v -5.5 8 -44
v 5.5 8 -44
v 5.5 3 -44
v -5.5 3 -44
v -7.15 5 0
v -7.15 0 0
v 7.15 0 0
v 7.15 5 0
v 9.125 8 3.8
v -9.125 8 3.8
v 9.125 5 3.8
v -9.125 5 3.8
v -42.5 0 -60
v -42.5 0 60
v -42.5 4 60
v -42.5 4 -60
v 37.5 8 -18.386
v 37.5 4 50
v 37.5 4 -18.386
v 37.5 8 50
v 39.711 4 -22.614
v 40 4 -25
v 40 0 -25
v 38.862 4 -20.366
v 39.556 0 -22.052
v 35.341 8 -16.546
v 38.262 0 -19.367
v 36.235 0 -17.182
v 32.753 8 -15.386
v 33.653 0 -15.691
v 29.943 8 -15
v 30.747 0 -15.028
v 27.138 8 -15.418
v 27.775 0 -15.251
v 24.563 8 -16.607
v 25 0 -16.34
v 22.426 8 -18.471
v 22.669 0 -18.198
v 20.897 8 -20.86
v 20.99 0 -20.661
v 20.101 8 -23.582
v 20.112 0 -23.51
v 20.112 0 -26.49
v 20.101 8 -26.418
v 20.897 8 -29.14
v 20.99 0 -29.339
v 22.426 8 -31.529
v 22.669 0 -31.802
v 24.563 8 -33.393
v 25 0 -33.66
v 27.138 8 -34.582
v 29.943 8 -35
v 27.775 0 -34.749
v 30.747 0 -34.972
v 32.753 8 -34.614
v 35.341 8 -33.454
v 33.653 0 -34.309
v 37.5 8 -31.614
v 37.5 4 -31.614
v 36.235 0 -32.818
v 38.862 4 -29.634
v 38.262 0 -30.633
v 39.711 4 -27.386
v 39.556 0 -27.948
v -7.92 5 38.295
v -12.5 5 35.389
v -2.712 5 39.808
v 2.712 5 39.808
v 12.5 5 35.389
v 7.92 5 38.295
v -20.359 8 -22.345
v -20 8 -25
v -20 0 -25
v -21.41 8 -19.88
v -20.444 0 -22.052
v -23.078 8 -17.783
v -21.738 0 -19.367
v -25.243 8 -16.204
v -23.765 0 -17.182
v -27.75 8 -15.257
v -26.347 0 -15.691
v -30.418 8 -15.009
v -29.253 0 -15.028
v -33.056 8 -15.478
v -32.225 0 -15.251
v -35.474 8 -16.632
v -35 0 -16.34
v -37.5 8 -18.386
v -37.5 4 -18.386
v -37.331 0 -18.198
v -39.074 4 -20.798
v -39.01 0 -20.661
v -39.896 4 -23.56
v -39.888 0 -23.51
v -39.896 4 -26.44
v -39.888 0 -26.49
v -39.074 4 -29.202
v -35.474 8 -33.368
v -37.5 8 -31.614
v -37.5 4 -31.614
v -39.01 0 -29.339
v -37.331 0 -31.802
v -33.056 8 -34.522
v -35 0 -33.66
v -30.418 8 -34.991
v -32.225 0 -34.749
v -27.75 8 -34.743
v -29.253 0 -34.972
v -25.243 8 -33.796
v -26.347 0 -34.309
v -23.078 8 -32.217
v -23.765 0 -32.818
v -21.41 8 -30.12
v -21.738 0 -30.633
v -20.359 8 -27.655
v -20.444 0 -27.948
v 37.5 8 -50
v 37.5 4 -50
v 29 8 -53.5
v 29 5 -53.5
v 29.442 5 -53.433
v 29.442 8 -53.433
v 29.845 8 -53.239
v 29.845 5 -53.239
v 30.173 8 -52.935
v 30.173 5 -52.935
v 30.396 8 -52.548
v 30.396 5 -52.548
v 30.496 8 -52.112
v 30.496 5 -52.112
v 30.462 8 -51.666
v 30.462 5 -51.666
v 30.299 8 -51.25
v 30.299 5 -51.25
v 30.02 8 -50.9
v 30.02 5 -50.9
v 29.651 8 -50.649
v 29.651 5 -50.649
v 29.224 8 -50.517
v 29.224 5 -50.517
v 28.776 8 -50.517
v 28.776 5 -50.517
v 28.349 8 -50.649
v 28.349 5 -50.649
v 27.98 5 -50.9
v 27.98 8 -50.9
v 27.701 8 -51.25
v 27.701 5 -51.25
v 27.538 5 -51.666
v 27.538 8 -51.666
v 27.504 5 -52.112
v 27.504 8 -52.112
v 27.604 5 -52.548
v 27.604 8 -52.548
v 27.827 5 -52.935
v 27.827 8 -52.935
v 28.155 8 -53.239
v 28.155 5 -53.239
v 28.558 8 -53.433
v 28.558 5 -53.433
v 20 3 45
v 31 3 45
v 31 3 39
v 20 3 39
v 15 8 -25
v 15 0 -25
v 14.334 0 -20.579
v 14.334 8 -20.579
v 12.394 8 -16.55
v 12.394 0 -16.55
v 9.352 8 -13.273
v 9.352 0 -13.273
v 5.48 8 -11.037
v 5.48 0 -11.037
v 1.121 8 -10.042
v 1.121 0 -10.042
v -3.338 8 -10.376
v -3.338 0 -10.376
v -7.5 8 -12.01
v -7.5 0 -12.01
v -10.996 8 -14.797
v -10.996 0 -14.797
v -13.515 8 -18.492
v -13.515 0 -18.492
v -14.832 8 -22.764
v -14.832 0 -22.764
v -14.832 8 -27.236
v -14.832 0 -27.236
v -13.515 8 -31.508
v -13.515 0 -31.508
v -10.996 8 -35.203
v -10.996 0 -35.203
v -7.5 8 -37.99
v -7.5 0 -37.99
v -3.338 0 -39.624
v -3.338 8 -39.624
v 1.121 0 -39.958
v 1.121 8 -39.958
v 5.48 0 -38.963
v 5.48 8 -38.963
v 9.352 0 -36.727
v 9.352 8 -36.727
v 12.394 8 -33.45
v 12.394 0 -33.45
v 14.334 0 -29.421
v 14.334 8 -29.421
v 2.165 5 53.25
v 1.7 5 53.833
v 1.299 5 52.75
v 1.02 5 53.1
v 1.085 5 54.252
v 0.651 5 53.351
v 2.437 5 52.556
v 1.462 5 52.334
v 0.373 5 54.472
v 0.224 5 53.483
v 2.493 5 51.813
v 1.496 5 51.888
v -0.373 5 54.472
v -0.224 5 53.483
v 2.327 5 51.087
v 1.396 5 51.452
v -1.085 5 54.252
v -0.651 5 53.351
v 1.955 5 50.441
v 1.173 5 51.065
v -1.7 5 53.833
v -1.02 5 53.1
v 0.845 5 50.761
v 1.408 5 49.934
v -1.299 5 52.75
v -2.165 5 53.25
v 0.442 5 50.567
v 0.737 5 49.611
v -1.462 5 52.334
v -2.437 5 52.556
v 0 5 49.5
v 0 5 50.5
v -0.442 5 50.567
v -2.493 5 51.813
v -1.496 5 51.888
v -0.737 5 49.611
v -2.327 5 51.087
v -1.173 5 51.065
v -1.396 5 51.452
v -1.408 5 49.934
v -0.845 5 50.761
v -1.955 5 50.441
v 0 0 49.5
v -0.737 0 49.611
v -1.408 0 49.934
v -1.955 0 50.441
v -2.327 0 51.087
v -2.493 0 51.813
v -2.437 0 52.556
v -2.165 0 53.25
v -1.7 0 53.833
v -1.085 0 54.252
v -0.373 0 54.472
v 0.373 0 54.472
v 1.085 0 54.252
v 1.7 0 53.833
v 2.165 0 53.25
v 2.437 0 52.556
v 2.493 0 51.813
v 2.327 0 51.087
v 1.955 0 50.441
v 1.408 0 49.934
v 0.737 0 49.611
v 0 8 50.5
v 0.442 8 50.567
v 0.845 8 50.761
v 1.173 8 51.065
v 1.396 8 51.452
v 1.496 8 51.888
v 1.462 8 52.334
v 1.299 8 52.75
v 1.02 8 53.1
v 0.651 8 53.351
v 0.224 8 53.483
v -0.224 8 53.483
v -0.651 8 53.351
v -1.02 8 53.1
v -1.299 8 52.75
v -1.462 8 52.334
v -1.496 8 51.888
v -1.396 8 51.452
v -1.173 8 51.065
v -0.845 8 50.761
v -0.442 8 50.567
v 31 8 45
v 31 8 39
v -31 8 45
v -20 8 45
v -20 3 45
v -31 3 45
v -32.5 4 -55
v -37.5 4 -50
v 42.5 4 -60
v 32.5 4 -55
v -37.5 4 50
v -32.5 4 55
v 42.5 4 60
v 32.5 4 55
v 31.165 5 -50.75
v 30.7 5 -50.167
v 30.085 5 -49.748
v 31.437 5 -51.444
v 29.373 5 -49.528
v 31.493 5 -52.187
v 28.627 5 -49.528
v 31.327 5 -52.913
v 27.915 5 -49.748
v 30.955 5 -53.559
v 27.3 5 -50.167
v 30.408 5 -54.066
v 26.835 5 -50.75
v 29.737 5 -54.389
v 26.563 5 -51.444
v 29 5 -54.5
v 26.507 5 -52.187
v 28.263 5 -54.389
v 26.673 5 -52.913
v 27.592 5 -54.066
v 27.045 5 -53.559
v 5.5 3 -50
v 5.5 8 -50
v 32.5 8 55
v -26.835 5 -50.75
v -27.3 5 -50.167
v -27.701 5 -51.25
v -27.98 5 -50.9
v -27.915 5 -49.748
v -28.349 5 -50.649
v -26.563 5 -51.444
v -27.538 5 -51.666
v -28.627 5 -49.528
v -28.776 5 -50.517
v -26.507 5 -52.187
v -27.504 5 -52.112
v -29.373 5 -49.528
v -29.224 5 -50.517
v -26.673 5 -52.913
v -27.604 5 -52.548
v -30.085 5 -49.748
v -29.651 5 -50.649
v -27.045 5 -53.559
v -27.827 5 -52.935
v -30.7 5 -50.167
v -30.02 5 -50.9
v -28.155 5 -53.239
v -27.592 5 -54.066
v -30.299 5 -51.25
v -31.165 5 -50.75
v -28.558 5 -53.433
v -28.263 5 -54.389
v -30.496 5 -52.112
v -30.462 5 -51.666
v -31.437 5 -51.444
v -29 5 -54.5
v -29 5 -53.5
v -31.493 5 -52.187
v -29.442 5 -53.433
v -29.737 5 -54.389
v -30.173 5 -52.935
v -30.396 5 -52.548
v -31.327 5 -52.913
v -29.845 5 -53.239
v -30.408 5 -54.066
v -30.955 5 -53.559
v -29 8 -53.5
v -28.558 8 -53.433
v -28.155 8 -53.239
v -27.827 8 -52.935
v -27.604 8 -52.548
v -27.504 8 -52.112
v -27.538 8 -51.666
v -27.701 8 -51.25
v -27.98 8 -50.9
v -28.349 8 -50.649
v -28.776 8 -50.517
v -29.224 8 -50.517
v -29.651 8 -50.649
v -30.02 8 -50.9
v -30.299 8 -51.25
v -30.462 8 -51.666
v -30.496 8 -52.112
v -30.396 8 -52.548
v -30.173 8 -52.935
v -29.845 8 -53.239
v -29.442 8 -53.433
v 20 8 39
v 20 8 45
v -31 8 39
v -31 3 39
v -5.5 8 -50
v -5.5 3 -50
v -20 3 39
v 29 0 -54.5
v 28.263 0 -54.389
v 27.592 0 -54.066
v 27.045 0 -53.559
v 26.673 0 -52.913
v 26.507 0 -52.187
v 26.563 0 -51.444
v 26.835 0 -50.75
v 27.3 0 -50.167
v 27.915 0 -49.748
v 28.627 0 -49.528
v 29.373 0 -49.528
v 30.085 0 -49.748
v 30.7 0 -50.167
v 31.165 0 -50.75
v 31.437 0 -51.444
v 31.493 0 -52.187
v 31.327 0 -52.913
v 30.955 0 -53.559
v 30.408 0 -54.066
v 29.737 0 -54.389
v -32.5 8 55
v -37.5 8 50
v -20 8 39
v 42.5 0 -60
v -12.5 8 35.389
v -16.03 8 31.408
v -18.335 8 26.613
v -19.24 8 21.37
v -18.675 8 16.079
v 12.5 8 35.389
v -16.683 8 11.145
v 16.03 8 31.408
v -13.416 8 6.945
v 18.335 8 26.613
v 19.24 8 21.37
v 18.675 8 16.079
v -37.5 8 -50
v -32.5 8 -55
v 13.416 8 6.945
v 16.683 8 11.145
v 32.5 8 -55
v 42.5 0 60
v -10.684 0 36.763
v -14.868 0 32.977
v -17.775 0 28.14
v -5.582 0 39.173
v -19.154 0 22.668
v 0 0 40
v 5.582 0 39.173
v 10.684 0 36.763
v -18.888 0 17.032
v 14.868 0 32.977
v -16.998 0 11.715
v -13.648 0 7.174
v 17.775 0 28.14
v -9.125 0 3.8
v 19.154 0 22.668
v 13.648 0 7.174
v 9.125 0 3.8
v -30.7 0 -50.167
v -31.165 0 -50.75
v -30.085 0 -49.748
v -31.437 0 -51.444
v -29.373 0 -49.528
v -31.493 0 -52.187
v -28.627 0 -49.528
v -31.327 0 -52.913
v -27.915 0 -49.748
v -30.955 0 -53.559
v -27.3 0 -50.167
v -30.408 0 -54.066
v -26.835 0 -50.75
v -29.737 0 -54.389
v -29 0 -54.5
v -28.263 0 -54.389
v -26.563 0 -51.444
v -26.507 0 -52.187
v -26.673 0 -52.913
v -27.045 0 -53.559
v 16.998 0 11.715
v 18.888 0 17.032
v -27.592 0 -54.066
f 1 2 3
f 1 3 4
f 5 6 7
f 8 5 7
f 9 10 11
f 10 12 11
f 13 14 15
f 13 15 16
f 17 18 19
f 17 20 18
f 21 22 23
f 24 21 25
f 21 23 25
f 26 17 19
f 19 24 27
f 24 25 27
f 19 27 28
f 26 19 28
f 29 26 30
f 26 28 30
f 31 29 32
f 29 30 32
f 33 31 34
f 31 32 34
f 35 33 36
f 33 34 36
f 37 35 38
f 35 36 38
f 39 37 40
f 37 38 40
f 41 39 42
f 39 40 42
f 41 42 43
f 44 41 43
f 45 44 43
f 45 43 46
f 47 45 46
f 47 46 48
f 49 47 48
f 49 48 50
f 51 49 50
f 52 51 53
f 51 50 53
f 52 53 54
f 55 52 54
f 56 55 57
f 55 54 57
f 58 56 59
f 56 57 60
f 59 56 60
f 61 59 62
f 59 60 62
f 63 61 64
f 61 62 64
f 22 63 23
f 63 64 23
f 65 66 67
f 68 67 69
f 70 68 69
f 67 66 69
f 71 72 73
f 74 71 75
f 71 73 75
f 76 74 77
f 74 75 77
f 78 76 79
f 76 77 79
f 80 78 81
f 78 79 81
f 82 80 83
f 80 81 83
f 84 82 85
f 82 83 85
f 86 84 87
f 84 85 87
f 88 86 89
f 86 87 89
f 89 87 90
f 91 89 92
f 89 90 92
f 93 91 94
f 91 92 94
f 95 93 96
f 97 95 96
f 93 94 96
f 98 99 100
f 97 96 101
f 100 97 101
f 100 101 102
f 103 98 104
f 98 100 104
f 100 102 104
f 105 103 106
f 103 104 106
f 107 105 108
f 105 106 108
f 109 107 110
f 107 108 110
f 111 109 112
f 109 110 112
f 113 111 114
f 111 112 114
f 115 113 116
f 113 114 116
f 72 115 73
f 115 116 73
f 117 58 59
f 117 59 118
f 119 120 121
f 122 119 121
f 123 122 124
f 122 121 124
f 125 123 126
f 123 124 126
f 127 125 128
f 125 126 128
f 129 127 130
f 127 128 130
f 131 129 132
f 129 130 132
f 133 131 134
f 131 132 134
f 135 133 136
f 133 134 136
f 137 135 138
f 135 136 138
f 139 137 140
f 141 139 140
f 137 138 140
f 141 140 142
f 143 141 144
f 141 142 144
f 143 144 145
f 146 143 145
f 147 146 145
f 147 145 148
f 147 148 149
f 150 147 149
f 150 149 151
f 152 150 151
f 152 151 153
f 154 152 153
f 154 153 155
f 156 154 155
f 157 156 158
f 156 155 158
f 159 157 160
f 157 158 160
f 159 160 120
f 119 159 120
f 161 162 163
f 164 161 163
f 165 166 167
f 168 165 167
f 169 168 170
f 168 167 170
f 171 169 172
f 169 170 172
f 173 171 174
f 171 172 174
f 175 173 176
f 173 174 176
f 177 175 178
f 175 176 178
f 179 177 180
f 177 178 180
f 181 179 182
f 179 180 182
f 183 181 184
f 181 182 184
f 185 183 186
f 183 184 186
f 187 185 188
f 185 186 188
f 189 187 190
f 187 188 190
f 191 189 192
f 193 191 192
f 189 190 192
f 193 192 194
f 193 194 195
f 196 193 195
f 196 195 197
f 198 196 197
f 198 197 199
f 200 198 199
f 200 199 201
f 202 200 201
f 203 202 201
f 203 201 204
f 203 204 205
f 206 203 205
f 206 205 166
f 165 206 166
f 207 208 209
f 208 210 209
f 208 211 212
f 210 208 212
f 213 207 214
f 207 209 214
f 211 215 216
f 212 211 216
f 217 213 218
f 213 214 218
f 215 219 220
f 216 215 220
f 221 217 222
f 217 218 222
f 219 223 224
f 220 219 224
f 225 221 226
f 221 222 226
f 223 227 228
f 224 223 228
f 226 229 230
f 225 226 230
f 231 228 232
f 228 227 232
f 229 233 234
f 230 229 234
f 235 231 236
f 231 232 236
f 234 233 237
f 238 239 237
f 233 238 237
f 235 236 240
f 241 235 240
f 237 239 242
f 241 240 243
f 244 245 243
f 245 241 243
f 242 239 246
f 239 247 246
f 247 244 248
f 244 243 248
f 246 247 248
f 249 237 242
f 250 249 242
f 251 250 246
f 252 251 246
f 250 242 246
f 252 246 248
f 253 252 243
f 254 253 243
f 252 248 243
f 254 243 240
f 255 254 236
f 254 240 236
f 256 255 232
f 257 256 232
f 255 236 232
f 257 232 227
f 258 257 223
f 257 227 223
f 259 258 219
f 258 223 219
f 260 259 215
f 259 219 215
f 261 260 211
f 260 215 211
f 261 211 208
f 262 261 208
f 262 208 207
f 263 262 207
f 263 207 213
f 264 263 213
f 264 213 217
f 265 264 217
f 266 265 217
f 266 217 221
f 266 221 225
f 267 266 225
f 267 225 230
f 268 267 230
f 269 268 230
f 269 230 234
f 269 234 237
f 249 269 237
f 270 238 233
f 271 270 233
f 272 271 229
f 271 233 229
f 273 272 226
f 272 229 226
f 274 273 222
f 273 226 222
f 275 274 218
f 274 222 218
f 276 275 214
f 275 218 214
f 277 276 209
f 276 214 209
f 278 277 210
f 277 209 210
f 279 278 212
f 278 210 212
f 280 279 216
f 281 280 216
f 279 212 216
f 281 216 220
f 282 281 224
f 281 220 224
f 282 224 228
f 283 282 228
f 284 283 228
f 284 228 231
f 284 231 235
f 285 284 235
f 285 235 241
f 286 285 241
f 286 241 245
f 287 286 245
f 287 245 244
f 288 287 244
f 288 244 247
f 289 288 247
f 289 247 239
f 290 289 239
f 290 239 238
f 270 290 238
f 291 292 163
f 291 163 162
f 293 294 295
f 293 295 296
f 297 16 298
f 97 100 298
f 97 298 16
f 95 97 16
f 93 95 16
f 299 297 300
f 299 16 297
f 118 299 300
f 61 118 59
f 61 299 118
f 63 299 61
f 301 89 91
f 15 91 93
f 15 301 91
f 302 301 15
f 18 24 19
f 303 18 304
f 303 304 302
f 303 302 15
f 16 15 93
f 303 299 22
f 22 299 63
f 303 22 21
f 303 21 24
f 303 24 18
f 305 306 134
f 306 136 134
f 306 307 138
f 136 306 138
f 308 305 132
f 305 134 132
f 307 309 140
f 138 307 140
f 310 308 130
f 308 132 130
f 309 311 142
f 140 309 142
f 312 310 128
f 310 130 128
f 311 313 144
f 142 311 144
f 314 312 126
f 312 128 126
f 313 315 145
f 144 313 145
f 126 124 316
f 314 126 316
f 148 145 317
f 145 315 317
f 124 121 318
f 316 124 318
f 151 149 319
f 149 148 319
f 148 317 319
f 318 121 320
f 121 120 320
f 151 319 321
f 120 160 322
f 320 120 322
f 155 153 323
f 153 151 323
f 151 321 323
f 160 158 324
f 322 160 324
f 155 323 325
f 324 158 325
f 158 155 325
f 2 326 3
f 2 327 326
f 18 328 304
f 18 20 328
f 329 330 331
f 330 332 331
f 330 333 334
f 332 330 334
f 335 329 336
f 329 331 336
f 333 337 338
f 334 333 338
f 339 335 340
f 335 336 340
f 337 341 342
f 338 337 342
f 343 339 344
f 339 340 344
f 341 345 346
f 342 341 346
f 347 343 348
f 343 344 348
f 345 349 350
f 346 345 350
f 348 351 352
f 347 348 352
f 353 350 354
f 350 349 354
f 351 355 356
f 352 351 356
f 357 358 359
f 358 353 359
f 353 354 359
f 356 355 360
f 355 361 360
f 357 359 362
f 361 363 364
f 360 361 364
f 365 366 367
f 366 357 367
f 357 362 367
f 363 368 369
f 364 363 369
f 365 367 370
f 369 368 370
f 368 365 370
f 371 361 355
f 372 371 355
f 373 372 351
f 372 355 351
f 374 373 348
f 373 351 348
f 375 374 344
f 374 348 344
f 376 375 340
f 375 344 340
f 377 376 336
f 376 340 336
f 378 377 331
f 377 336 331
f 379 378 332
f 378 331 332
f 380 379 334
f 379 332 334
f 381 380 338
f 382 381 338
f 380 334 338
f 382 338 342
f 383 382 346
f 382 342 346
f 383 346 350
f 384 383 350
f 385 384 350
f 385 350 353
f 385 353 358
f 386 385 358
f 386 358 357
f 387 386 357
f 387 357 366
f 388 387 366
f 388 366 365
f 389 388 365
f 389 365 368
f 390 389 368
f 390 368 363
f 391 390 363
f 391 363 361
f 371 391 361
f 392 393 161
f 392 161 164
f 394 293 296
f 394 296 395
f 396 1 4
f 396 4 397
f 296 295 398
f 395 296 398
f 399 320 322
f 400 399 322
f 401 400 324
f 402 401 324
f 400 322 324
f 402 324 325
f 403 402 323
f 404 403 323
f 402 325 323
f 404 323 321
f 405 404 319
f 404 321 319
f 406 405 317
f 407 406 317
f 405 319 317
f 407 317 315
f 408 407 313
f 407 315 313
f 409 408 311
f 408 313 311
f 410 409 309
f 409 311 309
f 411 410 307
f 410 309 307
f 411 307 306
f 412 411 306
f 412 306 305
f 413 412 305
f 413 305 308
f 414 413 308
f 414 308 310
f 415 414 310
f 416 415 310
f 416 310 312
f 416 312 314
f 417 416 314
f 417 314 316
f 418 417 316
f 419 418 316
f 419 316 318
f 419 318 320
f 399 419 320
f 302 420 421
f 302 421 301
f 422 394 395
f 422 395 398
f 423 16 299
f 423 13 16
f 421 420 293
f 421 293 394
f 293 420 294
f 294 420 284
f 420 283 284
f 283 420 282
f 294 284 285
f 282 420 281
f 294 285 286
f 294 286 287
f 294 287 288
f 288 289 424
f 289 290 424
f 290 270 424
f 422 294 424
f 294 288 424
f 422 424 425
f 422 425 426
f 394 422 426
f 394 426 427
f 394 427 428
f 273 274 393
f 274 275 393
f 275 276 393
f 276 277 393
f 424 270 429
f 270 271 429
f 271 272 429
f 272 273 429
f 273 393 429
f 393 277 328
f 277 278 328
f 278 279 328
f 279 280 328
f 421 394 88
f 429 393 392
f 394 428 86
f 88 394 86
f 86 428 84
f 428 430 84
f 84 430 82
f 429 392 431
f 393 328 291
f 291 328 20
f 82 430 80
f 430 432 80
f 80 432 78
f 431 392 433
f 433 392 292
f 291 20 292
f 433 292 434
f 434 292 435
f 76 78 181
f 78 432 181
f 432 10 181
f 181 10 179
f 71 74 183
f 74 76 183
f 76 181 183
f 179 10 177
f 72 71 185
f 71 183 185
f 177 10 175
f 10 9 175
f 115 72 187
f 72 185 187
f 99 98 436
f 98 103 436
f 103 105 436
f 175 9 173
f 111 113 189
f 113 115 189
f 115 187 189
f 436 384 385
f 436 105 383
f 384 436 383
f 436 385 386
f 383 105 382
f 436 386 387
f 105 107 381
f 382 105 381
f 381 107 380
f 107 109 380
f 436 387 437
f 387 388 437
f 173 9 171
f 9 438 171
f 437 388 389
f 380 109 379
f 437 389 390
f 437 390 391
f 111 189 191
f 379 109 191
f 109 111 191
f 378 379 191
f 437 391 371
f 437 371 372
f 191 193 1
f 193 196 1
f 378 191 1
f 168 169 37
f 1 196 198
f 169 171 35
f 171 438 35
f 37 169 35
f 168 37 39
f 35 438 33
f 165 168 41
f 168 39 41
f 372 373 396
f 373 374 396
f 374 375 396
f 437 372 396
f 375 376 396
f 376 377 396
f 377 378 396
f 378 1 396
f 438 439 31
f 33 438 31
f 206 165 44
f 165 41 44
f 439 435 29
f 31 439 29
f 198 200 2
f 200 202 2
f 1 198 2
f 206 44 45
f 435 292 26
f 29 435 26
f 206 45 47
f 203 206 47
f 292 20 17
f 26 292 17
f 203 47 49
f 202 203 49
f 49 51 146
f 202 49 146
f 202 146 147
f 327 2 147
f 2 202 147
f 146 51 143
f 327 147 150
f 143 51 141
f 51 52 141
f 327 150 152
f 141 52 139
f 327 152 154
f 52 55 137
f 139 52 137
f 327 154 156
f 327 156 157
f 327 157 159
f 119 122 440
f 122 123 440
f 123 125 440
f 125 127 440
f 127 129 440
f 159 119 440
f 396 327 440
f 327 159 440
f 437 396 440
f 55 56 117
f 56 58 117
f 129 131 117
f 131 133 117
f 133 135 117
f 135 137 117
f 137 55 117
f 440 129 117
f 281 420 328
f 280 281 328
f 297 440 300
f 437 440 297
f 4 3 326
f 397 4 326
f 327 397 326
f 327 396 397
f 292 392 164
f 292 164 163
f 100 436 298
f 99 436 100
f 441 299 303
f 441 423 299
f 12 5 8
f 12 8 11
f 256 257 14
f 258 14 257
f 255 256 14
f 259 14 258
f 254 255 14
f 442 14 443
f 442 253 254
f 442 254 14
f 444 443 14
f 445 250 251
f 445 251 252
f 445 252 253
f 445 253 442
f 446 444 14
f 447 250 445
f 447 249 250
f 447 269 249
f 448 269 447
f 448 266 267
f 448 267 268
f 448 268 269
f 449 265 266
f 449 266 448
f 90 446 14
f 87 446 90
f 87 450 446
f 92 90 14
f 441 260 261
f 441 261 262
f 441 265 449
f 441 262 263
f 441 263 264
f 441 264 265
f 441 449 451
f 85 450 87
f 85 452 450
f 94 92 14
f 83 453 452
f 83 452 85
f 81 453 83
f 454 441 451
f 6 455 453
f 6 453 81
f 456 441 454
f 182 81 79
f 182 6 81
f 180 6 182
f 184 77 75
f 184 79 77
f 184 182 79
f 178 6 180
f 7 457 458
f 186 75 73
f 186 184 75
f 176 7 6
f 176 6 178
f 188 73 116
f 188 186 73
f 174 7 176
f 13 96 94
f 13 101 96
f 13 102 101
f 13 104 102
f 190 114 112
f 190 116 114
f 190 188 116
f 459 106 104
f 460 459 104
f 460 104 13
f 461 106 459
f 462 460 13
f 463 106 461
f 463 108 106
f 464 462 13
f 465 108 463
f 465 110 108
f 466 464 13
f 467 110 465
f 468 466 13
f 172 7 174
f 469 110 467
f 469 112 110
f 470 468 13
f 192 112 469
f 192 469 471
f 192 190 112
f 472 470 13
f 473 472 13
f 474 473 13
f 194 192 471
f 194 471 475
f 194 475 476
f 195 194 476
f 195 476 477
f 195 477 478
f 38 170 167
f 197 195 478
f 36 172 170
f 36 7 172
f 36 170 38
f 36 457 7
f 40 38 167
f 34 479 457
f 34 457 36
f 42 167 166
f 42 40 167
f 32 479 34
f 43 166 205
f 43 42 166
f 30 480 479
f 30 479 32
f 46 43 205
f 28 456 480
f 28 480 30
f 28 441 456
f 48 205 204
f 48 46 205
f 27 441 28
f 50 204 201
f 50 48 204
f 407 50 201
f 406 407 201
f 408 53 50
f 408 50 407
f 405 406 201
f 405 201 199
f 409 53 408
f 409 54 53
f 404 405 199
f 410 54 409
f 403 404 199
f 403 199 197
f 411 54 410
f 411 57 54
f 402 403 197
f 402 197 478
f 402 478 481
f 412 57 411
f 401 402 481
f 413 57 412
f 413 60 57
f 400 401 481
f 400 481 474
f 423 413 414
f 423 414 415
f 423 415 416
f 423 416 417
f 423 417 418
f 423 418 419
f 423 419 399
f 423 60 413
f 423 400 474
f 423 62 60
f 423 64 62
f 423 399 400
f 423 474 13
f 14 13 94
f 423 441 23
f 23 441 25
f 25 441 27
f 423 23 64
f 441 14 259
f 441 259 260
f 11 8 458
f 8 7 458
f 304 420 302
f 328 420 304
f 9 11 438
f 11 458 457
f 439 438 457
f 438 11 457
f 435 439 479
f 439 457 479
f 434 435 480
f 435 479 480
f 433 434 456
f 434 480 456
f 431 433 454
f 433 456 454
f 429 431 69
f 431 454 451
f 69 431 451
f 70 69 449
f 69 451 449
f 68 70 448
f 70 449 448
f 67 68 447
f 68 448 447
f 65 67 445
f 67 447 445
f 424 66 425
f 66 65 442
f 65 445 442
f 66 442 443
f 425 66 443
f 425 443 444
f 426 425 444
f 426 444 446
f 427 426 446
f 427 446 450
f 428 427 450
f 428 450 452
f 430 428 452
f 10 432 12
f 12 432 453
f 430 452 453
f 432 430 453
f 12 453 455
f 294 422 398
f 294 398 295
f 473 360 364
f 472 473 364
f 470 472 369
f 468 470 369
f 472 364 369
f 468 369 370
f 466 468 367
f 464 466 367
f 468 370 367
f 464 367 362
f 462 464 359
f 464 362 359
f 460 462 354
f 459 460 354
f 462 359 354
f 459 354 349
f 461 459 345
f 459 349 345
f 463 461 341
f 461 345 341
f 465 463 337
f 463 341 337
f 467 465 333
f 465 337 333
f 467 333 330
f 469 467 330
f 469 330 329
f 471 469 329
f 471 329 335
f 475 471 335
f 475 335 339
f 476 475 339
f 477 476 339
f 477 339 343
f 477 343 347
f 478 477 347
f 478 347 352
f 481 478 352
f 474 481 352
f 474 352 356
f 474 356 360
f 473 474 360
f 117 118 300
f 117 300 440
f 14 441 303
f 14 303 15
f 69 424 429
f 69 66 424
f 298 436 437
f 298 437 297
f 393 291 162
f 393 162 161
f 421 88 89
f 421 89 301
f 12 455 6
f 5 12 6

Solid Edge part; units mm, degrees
sketch "Sketch1" plane through (0, 0, 0) normal (0, -1, 0) x (1, 0, 0)
  line L0 (-42.5, -60) -> (42.5, -60)
  line L1 (42.5, -60) -> (42.5, 60)
  line L2 (42.5, 60) -> (-42.5, 60)
  line L3 (-42.5, 60) -> (-42.5, -60)
  dimension "D1" = 85
  dimension "D2" = 120
extrude "Protrusion1" add sketch "Sketch1" against normal blind 8
sketch "Sketch2" plane through (0, 0, 0) normal (0, -1, 0) x (1, 0, 0)
  arc A0 (-9.1247, 3.8) -> (9.1247, 3.8) centre (0, 20.75) cw
  line L0 (7.15, 0) -> (9.1247, 3.8)
  line L1 (-7.15, 0) -> (7.15, 0)
  line L2 (-9.1247, 3.8) -> (-7.15, 0)
  dimension "D1" = 19.25
  dimension "D2" = 14.3
  dimension "D3" = 40
  dimension "D4" = 3.8
  dimension "D5" = 20
extrude "display_cut_1" cut sketch "Sketch2" against normal blind 5
sketch "Sketch3" plane through (0, 5, 10) normal (0, -1, 0) x (1, 0, 0)
  arc A0 (12.5, 25.3894) -> (9.1247, -6.2) centre (0, 10.75) cw
  line L0 (-9.1247, -6.2) -> (9.1247, -6.2)
  arc A1 (-12.5, 25.3894) -> (-9.1247, -6.2) centre (0, 10.75) ccw
  line L1 (-12.5, 25.3894) -> (12.5, 25.3894)
  dimension "D1" = 25
  dimension "D2" = 4.6106
extrude "Cutout1" cut sketch "Sketch3" against normal through all
sketch "Sketch4" plane through (0, 0, 0) normal (0, -1, 0) x (1, 0, 0)
  circle A0 centre (0, -25) radius 15
  circle A1 centre (-30, -25) radius 10
  circle A2 centre (30, -25) radius 10
  dimension "D1" = 30
  dimension "D2" = 35
  dimension "D3" = 20
  dimension "D4" = 80
extrude "Cutout2" cut sketch "Sketch4" against normal through all
sketch "Sketch5" plane through (0, 8, 0) normal (0, 1, 0) x (-1, 0, 0)
  line L0 (-5.5, -44) -> (5.5, -44)
  line L1 (5.5, -44) -> (5.5, -50)
  line L2 (5.5, -50) -> (-5.5, -50)
  line L3 (-5.5, -50) -> (-5.5, -44)
  line L4 (-31, 45) -> (-20, 45)
  line L5 (-20, 45) -> (-20, 39)
  line L6 (-20, 39) -> (-31, 39)
  line L7 (-31, 39) -> (-31, 45)
  line L8 (20, 45) -> (31, 45)
  line L9 (31, 45) -> (31, 39)
  line L10 (31, 39) -> (20, 39)
  line L11 (20, 39) -> (20, 45)
extrude "GY_521" cut sketch "Sketch5" against normal blind 5
sketch "Sketch6" plane through (0, 8, 0) normal (0, 1, 0) x (-1, 0, 0)
  line L0 (-37.5, -55) -> (37.5, -55)
  line L1 (37.5, -55) -> (37.5, 55)
  line L2 (37.5, 55) -> (-37.5, 55)
  line L3 (-37.5, 55) -> (-37.5, -55)
  dimension "D1" = 5
  dimension "D2" = 5
  dimension "D3" = 5
extrude "Extrusionsausschnitt_6" cut sketch "Sketch6" against normal blind 4 flip side to cut
chamfer "Fase_1" distance 5 angle 45 4 edges at (37.5, 6, 55) (-37.5, 6, 55) (-37.5, 6, -55) (37.5, 6, -55)
hole "Bohrung_1" at (0, 0, 52) direction (0, 1, 0) diameter 3 end up to next counterbore diameter 5 counterbore depth 5
hole "Hole1" at (-29, 0, -52) direction (0, 1, 0) diameter 3 end up to next counterbore diameter 5 counterbore depth 5
hole "Hole2" at (29, 0, -52) direction (0, 1, 0) diameter 3 end up to next counterbore diameter 5 counterbore depth 5
properties material "Nylon, allgemein"
